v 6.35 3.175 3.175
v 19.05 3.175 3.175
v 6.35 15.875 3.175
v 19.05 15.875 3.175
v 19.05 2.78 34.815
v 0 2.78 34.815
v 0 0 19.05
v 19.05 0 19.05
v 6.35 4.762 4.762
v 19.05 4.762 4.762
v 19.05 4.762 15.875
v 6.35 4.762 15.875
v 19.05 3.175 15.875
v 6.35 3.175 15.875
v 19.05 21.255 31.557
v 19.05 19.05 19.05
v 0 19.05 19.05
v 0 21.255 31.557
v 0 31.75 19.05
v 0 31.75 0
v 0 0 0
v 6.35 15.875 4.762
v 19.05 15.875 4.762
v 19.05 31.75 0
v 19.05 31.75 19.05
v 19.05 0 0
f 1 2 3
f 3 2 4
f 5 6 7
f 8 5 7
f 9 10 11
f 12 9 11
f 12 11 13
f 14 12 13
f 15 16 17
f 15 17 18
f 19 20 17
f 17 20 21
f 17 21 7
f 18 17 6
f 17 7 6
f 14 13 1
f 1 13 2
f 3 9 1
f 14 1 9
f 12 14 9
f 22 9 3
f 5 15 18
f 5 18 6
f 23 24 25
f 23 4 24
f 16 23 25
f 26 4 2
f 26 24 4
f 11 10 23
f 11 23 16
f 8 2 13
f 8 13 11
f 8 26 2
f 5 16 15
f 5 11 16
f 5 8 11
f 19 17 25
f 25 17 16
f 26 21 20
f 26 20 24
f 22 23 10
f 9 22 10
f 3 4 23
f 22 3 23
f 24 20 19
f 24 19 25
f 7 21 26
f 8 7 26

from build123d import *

# Parameters (mm, degrees)
F0_W     = 19.05
F0_H     = 19.05
F1_DEPTH = 19.05
F3_DEPTH = 12.7
F5_DEPTH = 19.05
F6_DEPTH = 12.7


with BuildPart() as f1:
    # F0 (on Top) → F1 (new body)
    with BuildSketch(Plane.XY):
        with Locations((9.525, 9.525)):
            Rectangle(F0_W, F0_H)
    extrude(amount=F1_DEPTH)

    # F2 (on face) → F3 (cut)
    with BuildSketch(Plane.YZ.offset(19.05)):
        Polygon((4.7625, 15.875), (3.175, 15.875), (3.175, 3.175), (15.875, 3.175), (15.875, 4.7625), (4.7625, 4.7625), align=None)
    extrude(amount=-F3_DEPTH, mode=Mode.SUBTRACT)

    # F4 (on face) → F5 (join)
    with BuildSketch(Plane.YZ.offset(19.05)):
        Polygon((2.7797596434, 34.8148003284), (0, 19.05), (19.05, 19.05), (21.2553318564, 31.5570584633), align=None)
    extrude(amount=-F5_DEPTH)

    # F6 (add): a face of the model
    f6_faces = [f1.faces().sort_by_distance(p)[0] for p in [
        (9.525, 19.05, 9.525),
    ]]
    extrude(f6_faces, amount=F6_DEPTH)


solid = f1.part
